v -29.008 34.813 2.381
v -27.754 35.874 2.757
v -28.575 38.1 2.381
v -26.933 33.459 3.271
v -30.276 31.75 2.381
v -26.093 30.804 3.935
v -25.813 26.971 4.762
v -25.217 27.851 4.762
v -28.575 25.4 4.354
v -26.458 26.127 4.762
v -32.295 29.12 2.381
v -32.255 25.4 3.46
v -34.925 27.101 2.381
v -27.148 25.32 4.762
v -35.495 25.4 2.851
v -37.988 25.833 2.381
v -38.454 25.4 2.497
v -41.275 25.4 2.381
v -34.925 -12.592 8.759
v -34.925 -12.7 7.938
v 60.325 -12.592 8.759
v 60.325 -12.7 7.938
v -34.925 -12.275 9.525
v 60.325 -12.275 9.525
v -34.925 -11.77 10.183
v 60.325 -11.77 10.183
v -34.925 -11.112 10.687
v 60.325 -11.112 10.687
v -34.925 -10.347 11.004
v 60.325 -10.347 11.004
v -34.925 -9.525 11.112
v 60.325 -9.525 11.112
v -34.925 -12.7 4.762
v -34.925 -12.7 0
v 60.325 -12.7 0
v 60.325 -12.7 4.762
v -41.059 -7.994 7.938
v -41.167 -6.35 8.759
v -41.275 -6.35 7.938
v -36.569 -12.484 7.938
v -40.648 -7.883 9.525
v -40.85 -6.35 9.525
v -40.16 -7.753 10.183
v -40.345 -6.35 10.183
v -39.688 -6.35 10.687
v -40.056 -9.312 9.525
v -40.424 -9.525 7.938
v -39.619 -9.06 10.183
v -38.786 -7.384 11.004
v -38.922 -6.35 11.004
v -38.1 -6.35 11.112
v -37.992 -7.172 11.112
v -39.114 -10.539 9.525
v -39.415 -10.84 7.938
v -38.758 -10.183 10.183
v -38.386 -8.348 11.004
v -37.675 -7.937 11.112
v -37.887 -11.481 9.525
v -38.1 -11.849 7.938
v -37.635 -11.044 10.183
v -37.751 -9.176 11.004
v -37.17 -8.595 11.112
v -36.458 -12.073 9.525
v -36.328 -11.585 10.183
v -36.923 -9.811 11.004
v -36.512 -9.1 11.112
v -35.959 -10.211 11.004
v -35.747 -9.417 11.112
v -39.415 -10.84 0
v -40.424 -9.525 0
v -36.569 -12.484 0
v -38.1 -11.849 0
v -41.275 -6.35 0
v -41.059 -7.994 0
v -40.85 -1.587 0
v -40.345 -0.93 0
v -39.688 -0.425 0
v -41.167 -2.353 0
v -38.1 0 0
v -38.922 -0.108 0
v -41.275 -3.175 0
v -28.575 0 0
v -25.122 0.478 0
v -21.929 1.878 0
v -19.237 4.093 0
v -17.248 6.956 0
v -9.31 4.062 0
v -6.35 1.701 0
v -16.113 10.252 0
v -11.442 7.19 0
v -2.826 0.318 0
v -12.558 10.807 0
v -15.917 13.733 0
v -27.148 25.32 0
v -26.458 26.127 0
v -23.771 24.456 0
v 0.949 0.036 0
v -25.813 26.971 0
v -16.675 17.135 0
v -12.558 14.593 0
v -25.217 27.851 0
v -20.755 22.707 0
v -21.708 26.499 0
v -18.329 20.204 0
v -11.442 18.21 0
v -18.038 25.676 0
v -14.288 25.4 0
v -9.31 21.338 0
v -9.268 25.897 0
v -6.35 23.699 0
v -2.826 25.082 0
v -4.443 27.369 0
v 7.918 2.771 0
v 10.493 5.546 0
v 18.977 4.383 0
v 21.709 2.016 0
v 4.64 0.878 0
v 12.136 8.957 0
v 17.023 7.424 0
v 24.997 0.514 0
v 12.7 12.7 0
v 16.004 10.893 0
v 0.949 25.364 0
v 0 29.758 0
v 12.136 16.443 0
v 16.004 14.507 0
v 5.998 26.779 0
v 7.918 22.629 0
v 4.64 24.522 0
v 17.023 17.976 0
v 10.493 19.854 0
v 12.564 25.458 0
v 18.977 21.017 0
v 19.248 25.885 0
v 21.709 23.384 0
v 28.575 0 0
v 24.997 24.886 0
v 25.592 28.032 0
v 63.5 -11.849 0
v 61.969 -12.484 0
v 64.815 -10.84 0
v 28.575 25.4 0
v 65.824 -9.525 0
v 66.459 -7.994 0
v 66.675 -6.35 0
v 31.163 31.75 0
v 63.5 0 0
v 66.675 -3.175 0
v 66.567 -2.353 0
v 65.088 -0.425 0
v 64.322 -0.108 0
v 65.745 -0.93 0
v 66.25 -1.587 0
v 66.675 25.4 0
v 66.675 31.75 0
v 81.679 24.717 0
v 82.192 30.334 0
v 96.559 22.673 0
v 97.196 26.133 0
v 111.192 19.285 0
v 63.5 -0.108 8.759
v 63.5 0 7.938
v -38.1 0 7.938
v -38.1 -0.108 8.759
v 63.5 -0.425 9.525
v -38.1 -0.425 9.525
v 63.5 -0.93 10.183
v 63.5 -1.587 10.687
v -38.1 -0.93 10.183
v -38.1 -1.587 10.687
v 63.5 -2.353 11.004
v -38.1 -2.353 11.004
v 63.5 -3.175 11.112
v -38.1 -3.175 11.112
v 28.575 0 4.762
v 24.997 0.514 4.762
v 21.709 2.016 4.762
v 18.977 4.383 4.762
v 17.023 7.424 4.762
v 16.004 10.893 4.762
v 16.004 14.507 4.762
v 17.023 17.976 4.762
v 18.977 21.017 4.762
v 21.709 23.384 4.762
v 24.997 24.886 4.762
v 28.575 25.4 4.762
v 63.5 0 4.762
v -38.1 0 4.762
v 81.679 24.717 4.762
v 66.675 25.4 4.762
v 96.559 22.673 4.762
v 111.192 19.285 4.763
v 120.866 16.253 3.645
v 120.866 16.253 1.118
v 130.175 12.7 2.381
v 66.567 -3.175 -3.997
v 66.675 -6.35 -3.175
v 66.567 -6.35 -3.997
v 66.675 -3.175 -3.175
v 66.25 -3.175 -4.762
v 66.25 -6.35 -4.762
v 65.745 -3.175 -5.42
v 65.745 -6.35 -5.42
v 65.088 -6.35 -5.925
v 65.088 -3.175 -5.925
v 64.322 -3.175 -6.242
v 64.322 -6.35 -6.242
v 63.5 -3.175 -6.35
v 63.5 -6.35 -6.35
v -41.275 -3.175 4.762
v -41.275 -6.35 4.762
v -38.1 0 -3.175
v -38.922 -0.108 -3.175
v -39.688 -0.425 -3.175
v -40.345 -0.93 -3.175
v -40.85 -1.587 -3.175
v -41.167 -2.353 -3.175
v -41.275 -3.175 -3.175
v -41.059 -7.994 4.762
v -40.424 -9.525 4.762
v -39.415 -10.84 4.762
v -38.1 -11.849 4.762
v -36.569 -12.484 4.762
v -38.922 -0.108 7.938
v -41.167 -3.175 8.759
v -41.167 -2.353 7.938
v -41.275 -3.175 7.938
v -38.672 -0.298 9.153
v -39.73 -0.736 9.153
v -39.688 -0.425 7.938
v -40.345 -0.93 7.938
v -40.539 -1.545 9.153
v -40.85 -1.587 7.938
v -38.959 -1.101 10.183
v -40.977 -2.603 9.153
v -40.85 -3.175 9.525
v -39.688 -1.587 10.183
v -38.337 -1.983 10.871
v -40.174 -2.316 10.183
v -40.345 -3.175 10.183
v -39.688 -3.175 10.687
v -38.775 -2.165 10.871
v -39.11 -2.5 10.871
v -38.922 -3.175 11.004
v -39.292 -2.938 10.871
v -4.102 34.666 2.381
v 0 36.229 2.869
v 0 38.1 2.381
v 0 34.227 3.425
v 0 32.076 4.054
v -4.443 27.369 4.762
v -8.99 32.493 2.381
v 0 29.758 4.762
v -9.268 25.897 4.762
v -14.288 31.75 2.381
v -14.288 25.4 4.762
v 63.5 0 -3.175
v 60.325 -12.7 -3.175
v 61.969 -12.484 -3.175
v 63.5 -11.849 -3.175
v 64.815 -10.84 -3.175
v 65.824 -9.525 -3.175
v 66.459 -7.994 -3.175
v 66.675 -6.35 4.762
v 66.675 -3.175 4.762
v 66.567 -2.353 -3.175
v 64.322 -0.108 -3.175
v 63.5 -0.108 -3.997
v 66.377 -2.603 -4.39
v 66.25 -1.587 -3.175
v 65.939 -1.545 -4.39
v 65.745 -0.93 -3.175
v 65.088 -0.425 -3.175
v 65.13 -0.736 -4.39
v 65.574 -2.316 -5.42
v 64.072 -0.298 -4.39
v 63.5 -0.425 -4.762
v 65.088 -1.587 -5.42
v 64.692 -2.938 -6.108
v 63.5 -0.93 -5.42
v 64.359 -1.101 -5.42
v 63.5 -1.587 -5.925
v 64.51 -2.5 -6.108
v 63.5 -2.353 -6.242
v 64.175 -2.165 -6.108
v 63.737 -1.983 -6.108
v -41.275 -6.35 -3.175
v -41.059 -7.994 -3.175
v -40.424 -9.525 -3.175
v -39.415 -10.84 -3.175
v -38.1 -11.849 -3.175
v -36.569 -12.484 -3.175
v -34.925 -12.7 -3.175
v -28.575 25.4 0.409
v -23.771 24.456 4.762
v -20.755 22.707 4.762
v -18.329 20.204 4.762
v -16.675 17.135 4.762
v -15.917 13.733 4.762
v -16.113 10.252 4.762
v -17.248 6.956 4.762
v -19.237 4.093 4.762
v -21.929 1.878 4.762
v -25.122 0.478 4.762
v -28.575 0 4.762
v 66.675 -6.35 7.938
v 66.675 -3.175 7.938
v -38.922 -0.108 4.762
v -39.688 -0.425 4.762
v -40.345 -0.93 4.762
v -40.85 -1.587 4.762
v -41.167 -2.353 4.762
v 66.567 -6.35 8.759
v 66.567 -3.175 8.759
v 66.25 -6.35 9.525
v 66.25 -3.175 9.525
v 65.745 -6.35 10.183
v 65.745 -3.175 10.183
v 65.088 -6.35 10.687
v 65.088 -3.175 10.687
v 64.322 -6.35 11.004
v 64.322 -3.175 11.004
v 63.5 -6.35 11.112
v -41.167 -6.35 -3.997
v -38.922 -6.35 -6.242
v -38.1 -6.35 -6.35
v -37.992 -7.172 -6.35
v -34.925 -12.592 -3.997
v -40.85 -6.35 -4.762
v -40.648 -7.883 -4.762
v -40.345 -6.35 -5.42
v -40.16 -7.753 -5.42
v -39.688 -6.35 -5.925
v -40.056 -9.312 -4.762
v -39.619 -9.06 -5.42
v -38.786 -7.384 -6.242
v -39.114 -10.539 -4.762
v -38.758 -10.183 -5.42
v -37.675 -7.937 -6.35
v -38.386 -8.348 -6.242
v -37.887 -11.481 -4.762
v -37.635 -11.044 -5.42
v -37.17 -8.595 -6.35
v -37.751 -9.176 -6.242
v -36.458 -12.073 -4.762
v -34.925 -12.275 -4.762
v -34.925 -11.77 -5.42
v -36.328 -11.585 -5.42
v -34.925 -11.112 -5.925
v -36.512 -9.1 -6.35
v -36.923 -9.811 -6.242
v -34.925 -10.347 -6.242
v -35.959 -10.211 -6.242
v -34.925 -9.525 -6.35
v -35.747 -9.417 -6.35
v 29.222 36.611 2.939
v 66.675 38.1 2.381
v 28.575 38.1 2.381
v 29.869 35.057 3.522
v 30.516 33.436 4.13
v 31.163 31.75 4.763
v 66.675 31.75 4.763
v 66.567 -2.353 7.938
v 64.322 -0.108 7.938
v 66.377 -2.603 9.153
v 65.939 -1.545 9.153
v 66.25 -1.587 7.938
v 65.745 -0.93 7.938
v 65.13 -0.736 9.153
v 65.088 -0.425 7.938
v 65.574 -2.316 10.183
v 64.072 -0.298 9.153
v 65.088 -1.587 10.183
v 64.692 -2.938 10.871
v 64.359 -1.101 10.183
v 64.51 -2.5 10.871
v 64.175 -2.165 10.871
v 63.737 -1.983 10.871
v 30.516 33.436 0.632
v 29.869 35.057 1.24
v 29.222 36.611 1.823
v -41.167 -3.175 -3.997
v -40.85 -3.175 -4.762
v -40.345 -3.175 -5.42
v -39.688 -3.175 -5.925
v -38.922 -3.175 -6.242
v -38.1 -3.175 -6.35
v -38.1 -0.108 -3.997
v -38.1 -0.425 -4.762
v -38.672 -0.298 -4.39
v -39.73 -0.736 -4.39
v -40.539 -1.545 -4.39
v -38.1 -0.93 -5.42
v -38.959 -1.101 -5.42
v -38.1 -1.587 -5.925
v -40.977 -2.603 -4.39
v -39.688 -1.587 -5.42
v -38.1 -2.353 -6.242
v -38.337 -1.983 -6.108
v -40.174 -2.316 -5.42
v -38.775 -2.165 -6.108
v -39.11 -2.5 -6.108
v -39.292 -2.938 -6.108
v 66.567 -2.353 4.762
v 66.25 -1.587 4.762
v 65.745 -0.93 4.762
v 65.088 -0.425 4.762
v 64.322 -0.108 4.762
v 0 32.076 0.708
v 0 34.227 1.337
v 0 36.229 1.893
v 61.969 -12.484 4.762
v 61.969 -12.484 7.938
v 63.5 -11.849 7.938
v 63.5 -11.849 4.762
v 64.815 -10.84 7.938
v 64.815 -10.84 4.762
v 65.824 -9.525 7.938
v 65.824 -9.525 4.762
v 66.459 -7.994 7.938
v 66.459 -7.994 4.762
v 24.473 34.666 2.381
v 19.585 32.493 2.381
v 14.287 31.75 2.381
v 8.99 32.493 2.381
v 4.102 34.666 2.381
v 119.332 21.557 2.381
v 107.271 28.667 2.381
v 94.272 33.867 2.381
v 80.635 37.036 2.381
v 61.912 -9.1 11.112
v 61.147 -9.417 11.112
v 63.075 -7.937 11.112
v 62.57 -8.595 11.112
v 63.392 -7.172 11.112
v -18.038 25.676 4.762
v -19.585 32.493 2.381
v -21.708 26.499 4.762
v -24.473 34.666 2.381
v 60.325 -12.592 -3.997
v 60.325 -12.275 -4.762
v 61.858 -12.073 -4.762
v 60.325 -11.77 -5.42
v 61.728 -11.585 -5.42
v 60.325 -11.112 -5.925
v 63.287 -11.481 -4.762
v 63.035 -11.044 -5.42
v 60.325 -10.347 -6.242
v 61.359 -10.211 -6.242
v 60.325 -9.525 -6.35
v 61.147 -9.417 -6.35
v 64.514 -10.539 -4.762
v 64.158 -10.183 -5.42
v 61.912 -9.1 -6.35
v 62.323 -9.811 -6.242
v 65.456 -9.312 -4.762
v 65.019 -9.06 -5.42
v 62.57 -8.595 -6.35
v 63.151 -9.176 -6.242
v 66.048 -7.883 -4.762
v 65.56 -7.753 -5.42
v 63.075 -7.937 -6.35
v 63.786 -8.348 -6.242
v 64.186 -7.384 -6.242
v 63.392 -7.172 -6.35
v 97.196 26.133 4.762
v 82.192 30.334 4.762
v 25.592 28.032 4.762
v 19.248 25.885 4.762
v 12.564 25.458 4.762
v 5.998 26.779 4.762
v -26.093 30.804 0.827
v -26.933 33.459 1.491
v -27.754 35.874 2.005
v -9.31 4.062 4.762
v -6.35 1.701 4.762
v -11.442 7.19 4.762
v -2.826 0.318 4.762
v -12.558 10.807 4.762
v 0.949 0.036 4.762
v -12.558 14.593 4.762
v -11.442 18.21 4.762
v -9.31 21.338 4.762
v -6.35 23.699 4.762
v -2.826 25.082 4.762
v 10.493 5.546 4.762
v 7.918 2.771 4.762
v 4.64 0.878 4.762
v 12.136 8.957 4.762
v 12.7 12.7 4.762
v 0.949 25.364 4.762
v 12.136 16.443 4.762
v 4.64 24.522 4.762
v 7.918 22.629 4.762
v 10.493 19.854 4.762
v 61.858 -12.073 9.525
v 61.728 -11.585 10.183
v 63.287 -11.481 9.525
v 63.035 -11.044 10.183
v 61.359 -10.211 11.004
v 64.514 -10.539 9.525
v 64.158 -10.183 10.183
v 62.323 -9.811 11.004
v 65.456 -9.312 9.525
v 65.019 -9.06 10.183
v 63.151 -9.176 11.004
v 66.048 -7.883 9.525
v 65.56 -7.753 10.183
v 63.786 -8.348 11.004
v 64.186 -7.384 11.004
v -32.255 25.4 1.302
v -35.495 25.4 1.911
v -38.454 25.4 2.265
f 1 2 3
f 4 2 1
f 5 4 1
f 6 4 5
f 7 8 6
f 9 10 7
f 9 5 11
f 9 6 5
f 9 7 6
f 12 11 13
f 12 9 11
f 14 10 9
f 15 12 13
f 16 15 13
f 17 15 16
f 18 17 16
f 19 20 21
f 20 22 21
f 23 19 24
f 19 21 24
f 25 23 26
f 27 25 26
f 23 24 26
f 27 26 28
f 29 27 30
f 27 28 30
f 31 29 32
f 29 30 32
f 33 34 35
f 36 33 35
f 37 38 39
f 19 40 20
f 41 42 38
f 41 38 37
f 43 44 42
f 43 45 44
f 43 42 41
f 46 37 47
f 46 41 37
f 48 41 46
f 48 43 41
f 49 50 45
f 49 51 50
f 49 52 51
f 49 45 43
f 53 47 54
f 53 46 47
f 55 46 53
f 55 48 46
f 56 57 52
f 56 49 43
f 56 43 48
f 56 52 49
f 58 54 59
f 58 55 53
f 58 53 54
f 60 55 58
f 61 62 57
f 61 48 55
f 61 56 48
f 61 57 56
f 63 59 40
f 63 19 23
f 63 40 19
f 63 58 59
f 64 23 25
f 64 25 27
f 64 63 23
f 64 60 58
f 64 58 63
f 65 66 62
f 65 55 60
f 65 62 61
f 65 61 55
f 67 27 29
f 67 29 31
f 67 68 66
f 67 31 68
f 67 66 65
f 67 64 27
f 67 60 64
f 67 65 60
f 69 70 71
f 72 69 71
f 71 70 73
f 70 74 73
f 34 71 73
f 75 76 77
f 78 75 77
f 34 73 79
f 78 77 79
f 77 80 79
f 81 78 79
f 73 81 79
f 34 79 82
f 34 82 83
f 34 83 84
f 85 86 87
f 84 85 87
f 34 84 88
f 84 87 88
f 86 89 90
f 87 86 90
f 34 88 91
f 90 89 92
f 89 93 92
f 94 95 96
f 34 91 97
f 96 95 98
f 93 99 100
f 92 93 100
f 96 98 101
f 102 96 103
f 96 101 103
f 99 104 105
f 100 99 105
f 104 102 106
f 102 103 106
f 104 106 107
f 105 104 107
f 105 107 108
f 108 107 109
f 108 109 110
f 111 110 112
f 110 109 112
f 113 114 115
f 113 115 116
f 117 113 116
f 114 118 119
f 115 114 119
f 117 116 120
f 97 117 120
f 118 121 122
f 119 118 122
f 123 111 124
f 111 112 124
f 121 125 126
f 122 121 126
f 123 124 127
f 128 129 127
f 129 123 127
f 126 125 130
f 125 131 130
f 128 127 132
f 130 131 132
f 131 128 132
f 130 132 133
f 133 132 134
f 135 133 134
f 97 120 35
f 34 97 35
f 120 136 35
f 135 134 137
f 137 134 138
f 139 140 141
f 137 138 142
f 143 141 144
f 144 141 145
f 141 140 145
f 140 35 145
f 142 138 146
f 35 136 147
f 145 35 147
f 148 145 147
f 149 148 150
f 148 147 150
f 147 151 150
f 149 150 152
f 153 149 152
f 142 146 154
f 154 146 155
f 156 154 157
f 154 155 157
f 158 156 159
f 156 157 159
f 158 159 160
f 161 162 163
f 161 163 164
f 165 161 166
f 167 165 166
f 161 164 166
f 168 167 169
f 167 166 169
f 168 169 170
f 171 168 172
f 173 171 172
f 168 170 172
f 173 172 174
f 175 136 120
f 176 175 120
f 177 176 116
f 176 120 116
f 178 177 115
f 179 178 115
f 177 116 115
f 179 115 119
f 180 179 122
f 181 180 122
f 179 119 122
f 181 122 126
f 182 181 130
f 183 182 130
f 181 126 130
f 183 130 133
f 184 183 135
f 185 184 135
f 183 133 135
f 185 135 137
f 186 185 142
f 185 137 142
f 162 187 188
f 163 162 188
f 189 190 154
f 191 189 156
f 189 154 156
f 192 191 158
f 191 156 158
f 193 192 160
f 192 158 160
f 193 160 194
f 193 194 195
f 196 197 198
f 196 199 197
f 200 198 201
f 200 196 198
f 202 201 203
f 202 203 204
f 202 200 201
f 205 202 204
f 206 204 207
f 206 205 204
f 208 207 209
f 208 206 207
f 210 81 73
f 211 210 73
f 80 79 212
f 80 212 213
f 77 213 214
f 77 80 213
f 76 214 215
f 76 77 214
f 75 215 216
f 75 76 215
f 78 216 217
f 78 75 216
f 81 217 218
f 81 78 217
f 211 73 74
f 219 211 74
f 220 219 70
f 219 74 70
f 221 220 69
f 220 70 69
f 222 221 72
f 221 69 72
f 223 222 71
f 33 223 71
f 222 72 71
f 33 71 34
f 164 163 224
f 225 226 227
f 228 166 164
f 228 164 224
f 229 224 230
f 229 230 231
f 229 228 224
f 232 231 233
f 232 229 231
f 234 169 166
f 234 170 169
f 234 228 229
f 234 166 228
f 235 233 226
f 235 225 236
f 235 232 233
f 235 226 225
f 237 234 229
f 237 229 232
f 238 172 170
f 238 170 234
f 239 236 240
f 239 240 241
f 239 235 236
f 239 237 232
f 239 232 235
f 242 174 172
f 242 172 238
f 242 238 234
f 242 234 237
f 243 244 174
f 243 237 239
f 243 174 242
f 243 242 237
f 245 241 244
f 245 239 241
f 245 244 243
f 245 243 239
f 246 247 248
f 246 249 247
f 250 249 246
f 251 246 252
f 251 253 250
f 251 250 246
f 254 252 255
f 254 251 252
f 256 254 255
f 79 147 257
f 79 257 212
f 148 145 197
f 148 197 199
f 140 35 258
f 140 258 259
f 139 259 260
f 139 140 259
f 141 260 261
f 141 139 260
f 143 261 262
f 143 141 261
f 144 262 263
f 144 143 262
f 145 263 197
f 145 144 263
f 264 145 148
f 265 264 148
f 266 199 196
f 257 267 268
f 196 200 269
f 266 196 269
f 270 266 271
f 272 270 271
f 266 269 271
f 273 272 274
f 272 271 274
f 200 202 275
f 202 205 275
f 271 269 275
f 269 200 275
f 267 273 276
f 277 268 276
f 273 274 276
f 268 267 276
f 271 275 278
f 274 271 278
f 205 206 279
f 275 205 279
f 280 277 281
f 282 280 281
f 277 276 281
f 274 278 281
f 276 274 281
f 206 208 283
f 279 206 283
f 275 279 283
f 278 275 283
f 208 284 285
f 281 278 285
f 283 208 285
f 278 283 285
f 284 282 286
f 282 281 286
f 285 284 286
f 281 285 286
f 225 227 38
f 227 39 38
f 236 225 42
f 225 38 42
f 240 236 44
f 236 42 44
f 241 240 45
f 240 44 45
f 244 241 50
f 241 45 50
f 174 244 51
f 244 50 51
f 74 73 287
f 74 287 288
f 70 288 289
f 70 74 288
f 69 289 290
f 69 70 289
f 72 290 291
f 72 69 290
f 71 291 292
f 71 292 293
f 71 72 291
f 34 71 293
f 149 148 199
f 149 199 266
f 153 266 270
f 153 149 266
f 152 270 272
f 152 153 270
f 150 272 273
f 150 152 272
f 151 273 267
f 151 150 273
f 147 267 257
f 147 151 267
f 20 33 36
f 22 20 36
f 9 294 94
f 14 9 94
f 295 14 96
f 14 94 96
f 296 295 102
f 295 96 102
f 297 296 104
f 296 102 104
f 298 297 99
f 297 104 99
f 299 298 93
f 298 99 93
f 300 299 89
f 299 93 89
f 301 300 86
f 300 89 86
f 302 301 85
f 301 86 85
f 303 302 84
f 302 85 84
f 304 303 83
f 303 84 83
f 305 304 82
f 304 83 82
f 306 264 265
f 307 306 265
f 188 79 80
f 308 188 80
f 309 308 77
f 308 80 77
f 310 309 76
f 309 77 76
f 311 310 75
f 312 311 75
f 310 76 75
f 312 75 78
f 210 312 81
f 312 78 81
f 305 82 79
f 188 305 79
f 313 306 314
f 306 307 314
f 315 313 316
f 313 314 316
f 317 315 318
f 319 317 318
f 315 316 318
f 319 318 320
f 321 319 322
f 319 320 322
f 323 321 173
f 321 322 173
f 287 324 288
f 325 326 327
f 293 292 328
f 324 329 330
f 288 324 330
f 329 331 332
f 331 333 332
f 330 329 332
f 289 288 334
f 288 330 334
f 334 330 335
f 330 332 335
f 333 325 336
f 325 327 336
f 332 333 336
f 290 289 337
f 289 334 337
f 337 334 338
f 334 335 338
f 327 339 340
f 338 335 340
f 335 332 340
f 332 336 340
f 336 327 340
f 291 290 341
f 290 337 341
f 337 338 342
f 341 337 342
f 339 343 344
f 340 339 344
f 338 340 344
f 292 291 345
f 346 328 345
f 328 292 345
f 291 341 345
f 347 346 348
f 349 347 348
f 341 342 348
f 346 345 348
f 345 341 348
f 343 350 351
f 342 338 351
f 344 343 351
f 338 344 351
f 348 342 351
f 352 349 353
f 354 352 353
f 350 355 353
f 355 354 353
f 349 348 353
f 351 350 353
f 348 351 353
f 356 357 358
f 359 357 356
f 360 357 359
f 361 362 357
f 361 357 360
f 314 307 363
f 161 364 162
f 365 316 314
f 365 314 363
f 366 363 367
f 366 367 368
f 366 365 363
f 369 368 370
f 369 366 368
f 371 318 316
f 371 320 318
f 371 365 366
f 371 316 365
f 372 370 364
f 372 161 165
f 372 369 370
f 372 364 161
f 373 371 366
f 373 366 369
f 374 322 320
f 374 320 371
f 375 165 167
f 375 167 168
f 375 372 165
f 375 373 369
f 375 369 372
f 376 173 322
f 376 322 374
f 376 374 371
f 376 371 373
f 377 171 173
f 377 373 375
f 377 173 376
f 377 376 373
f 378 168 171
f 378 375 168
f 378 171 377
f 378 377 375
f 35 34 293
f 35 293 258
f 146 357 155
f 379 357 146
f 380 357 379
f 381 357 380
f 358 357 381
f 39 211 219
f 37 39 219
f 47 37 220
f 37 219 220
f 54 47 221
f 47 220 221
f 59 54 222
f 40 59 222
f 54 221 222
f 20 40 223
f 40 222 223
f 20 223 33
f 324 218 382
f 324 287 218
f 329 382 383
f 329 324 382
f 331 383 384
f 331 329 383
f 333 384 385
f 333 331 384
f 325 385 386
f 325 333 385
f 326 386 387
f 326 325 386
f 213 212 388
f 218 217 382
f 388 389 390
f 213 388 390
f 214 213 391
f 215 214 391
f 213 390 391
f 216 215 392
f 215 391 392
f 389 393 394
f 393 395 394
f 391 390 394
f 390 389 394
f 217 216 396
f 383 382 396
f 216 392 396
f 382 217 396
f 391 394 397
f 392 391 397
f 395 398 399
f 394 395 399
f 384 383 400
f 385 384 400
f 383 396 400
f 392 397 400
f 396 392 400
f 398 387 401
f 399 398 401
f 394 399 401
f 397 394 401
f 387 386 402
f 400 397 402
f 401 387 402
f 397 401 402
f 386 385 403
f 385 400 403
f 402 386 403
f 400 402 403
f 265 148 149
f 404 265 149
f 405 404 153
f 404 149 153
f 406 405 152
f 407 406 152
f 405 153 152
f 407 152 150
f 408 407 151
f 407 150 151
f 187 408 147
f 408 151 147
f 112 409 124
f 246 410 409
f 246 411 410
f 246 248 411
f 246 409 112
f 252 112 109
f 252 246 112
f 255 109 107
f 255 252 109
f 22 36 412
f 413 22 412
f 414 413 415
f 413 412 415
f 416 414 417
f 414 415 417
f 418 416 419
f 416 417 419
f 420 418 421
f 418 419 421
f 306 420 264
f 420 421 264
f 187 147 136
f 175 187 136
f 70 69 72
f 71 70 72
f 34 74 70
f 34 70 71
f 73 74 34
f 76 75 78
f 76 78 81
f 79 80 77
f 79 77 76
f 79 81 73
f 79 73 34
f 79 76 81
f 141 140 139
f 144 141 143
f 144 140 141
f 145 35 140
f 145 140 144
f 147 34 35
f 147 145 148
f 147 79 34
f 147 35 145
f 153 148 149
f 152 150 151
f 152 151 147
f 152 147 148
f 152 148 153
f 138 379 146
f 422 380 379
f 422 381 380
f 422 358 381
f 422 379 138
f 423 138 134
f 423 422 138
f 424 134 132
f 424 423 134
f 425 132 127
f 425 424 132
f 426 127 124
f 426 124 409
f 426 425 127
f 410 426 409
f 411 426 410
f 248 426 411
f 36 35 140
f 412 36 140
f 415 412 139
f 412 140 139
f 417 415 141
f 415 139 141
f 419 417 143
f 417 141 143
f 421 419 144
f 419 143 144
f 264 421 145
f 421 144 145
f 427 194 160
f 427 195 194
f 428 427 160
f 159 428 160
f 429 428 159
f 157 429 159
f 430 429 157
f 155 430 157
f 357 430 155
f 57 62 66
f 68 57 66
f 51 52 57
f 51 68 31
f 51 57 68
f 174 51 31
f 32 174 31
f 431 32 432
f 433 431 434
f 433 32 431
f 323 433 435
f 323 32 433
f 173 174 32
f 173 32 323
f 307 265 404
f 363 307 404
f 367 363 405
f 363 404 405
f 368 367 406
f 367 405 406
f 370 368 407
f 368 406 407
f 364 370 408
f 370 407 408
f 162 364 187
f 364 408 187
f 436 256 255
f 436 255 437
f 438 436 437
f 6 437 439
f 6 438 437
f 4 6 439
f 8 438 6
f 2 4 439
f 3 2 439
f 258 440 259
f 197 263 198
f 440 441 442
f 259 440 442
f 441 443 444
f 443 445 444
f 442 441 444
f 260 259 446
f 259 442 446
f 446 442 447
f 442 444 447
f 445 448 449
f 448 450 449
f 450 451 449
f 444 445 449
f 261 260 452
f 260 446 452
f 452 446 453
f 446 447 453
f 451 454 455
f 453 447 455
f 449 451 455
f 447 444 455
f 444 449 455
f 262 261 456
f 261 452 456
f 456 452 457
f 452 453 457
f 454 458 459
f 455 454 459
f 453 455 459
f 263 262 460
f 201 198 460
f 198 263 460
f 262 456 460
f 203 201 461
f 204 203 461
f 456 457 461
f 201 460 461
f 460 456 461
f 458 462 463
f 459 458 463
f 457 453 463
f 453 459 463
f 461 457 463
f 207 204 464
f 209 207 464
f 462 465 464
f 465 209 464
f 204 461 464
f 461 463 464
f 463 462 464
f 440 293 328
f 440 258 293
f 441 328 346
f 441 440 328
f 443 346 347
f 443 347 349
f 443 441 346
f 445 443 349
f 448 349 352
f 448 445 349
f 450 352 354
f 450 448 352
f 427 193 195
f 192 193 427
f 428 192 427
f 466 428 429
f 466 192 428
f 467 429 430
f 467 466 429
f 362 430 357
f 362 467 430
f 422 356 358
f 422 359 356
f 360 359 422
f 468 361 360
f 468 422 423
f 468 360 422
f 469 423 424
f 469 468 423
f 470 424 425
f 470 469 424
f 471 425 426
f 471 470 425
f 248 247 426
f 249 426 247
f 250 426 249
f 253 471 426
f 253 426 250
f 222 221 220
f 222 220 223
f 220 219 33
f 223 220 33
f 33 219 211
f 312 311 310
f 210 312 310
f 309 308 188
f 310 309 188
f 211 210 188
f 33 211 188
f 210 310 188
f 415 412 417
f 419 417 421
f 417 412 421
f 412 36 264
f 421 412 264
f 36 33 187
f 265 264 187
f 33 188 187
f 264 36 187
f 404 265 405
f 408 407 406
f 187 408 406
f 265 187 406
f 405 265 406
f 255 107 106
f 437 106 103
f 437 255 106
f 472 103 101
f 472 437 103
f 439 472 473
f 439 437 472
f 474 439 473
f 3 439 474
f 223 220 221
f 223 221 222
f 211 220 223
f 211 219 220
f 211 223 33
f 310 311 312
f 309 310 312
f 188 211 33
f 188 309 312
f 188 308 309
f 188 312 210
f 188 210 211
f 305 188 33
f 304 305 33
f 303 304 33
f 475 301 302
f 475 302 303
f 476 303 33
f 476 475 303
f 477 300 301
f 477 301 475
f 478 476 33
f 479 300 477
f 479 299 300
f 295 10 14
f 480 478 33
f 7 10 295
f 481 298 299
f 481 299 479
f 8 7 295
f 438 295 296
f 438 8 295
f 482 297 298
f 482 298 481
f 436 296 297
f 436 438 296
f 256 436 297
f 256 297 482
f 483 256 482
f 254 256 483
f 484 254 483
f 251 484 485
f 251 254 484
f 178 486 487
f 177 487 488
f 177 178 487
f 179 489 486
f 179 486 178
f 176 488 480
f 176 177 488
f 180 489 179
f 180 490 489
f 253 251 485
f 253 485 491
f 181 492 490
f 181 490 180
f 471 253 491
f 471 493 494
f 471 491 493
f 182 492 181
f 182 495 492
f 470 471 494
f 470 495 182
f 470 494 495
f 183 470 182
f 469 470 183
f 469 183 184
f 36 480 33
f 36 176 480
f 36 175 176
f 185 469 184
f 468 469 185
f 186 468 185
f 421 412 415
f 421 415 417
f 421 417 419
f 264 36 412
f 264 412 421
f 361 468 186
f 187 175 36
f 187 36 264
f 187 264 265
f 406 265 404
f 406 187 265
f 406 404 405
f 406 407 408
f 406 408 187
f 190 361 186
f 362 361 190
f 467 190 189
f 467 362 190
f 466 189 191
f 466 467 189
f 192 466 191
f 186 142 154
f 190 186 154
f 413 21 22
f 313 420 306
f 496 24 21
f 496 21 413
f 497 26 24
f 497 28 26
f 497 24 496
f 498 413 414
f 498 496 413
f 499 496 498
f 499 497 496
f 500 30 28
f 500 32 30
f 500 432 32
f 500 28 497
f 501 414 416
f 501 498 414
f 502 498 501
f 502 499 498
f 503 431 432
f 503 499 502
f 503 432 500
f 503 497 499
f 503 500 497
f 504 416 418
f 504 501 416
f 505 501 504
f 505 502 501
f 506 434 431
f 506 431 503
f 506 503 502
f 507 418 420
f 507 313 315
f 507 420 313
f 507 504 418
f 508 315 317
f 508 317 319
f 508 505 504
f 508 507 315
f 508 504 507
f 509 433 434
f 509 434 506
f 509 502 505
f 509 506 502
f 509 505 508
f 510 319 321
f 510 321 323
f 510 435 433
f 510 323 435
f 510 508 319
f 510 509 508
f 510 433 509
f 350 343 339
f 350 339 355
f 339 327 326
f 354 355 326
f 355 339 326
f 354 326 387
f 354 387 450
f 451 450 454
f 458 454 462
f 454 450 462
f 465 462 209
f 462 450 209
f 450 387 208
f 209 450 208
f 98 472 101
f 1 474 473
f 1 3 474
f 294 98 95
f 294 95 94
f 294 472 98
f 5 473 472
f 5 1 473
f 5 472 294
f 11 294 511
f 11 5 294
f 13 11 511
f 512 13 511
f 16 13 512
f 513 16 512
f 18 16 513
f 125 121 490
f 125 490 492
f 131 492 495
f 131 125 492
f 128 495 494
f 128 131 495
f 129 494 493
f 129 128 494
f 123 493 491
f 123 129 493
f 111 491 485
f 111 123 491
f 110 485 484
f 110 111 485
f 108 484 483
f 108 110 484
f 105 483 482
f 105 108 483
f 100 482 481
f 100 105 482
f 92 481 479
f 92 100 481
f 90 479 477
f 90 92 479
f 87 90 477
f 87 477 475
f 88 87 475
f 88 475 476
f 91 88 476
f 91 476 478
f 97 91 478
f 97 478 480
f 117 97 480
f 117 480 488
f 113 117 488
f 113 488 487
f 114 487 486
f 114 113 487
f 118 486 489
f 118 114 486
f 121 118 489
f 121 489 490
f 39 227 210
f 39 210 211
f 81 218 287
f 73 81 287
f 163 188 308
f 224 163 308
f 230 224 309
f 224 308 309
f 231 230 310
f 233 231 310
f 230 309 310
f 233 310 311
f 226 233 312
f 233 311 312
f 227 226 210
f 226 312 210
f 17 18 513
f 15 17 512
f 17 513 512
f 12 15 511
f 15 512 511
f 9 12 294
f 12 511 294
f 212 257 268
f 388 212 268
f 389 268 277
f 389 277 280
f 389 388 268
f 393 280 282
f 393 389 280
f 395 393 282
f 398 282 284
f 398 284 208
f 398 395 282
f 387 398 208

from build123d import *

# Parameters (mm, degrees)
F0_R     = 12.7
F1_DEPTH = 4.7625
F3_START = 4.7625
F3_DEPTH = 6.35
F4_DEPTH = 6.35
F5_R     = 3.175
F5_2_R   = 3.175
F6_SIZE2 = 6.35
F6_SIZE  = 2.38125
F7_SIZE2 = 2.38124
F7_SIZE  = 6.34999


# Not quite as in the source:
# - a fillet or chamfer is up to 0.001 mm smaller than in the source, because OpenCascade refuses the exact size


with BuildPart() as f1:
    # F0 (on Top) → F1 (new body)
    with BuildSketch(Plane.XY):
        with BuildLine():
            Line((63.5, 0), (28.575, 0))
            ThreePointArc((28.575, 0), (15.875, 12.7), (28.575, 25.4))
            Line((28.575, 25.4), (66.675, 25.4))
            ThreePointArc((66.675, 25.4), (99.0537739113, 22.1938695566), (130.175, 12.7))
            ThreePointArc((130.175, 12.7), (100.8707965253, 31.5144913133), (66.675, 38.1))
            Line((66.675, 38.1), (28.575, 38.1))
            ThreePointArc((28.575, 38.1), (14.2875, 31.75), (0, 38.1))
            ThreePointArc((0, 38.1), (-6.4699695128, 33.408993013), (-14.2875007235, 31.75))
            ThreePointArc((-14.2875007235, 31.75), (-22.1050316037, 33.4089930196), (-28.5750007235, 38.1))
            ThreePointArc((-28.5750007235, 38.1), (-32.2947446025, 29.1197438789), (-41.2750007235, 25.4))
            Line((-41.2750007235, 25.4), (-28.5750007235, 25.4))
            ThreePointArc((-28.5750007235, 25.4), (-15.8750007235, 12.7), (-28.5750007235, 0))
            Line((-28.5750007235, 0), (-38.1000007235, 0))
            ThreePointArc((-38.1000007235, 0), (-40.3450647538, -0.9299359697), (-41.2750007235, -3.175))
            Line((-41.2750007235, -3.175), (-41.2750007235, -6.35))
            ThreePointArc((-41.2750007235, -6.35), (-39.4151287841, -10.8401280605), (-34.9250007235, -12.7))
            Line((-34.9250007235, -12.7), (60.325, -12.7))
            ThreePointArc((60.325, -12.7), (64.8151280605, -10.8401280605), (66.675, -6.35))
            Line((66.675, -6.35), (66.675, -3.175))
            ThreePointArc((66.675, -3.175), (65.7450640303, -0.9299359697), (63.5, 0))
        make_face()
        with Locations((0, 12.7)):
            Circle(F0_R, mode=Mode.SUBTRACT)
    extrude(amount=F1_DEPTH)

    # F6
    f6_edges = [f1.edges().sort_by_distance(p)[0] for p in [
        (47.625, 38.1, 4.7625),
        (14.2875, 31.75, 4.7625),
        (100.870797, 31.514491, 4.7625),
        (-22.105032, 33.408993, 4.7625),
        (-6.46997, 33.408993, 4.7625),
        (-32.294745, 29.119744, 4.7625),
    ]]
    chamfer(f6_edges, length=F6_SIZE, length2=F6_SIZE2)

    # F7 (size 6.35 and 2.38125 in the source; OpenCascade refuses exactly that, so slightly less here)
    f7_edges = [f1.edges().sort_by_distance(p)[0] for p in [
        (-32.294745, 29.119744, 0),
        (-22.105032, 33.408993, 0),
        (-6.46997, 33.408993, 0),
        (14.2875, 31.75, 0),
        (47.625, 38.1, 0),
        (100.870797, 31.514491, 0),
    ]]
    f7_side = f1.faces().sort_by_distance((-31.030313, 27.855312, 0))[0]
    chamfer(f7_edges, length=F7_SIZE, length2=F7_SIZE2, reference=f7_side)


with BuildPart() as f3:
    # F2 (on Top) → F3 (new body)
    with BuildSketch(Plane.XY.offset(F3_START)):
        with BuildLine():
            Line((63.5, 0), (-38.1, 0))
            ThreePointArc((-38.1, 0), (-40.3450640303, -0.9299359697), (-41.275, -3.175))
            Line((-41.275, -3.175), (-41.275, -6.35))
            ThreePointArc((-41.275, -6.35), (-39.4151280605, -10.8401280605), (-34.925, -12.7))
            Line((-34.925, -12.7), (60.325, -12.7))
            ThreePointArc((60.325, -12.7), (64.8151280605, -10.8401280605), (66.675, -6.35))
            Line((66.675, -6.35), (66.675, -3.175))
            ThreePointArc((66.675, -3.175), (65.7450640303, -0.9299359697), (63.5, 0))
        make_face()
    extrude(amount=F3_DEPTH)

    # F5
    f5_edges = [f3.edges().sort_by_distance(p)[0] for p in [
        (12.7, 0, 11.1125),
        (-40.345064, -0.929936, 11.1125),
        (-41.275, -4.7625, 11.1125),
        (-39.415128, -10.840128, 11.1125),
        (12.7, -12.7, 11.1125),
        (64.815128, -10.840128, 11.1125),
        (66.675, -4.7625, 11.1125),
        (65.745064, -0.929936, 11.1125),
    ]]
    fillet(f5_edges, radius=F5_R)


with BuildPart() as f4:
    # F2 (on Top) → F4 (new body)
    with BuildSketch(Plane.XY):
        with BuildLine():
            Line((63.5, 0), (-38.1, 0))
            ThreePointArc((-38.1, 0), (-40.3450640303, -0.9299359697), (-41.275, -3.175))
            Line((-41.275, -3.175), (-41.275, -6.35))
            ThreePointArc((-41.275, -6.35), (-39.4151280605, -10.8401280605), (-34.925, -12.7))
            Line((-34.925, -12.7), (60.325, -12.7))
            ThreePointArc((60.325, -12.7), (64.8151280605, -10.8401280605), (66.675, -6.35))
            Line((66.675, -6.35), (66.675, -3.175))
            ThreePointArc((66.675, -3.175), (65.7450640303, -0.9299359697), (63.5, 0))
        make_face()
    extrude(amount=-F4_DEPTH)

    # F5#2
    f5_2_edges = [f4.edges().sort_by_distance(p)[0] for p in [
        (12.7, 0, -6.35),
        (-40.345064, -0.929936, -6.35),
        (-41.275, -4.7625, -6.35),
        (-39.415128, -10.840128, -6.35),
        (12.7, -12.7, -6.35),
        (64.815128, -10.840128, -6.35),
        (66.675, -4.7625, -6.35),
        (65.745064, -0.929936, -6.35),
    ]]
    fillet(f5_2_edges, radius=F5_2_R)


solid = Compound([f1.part, f3.part, f4.part])
